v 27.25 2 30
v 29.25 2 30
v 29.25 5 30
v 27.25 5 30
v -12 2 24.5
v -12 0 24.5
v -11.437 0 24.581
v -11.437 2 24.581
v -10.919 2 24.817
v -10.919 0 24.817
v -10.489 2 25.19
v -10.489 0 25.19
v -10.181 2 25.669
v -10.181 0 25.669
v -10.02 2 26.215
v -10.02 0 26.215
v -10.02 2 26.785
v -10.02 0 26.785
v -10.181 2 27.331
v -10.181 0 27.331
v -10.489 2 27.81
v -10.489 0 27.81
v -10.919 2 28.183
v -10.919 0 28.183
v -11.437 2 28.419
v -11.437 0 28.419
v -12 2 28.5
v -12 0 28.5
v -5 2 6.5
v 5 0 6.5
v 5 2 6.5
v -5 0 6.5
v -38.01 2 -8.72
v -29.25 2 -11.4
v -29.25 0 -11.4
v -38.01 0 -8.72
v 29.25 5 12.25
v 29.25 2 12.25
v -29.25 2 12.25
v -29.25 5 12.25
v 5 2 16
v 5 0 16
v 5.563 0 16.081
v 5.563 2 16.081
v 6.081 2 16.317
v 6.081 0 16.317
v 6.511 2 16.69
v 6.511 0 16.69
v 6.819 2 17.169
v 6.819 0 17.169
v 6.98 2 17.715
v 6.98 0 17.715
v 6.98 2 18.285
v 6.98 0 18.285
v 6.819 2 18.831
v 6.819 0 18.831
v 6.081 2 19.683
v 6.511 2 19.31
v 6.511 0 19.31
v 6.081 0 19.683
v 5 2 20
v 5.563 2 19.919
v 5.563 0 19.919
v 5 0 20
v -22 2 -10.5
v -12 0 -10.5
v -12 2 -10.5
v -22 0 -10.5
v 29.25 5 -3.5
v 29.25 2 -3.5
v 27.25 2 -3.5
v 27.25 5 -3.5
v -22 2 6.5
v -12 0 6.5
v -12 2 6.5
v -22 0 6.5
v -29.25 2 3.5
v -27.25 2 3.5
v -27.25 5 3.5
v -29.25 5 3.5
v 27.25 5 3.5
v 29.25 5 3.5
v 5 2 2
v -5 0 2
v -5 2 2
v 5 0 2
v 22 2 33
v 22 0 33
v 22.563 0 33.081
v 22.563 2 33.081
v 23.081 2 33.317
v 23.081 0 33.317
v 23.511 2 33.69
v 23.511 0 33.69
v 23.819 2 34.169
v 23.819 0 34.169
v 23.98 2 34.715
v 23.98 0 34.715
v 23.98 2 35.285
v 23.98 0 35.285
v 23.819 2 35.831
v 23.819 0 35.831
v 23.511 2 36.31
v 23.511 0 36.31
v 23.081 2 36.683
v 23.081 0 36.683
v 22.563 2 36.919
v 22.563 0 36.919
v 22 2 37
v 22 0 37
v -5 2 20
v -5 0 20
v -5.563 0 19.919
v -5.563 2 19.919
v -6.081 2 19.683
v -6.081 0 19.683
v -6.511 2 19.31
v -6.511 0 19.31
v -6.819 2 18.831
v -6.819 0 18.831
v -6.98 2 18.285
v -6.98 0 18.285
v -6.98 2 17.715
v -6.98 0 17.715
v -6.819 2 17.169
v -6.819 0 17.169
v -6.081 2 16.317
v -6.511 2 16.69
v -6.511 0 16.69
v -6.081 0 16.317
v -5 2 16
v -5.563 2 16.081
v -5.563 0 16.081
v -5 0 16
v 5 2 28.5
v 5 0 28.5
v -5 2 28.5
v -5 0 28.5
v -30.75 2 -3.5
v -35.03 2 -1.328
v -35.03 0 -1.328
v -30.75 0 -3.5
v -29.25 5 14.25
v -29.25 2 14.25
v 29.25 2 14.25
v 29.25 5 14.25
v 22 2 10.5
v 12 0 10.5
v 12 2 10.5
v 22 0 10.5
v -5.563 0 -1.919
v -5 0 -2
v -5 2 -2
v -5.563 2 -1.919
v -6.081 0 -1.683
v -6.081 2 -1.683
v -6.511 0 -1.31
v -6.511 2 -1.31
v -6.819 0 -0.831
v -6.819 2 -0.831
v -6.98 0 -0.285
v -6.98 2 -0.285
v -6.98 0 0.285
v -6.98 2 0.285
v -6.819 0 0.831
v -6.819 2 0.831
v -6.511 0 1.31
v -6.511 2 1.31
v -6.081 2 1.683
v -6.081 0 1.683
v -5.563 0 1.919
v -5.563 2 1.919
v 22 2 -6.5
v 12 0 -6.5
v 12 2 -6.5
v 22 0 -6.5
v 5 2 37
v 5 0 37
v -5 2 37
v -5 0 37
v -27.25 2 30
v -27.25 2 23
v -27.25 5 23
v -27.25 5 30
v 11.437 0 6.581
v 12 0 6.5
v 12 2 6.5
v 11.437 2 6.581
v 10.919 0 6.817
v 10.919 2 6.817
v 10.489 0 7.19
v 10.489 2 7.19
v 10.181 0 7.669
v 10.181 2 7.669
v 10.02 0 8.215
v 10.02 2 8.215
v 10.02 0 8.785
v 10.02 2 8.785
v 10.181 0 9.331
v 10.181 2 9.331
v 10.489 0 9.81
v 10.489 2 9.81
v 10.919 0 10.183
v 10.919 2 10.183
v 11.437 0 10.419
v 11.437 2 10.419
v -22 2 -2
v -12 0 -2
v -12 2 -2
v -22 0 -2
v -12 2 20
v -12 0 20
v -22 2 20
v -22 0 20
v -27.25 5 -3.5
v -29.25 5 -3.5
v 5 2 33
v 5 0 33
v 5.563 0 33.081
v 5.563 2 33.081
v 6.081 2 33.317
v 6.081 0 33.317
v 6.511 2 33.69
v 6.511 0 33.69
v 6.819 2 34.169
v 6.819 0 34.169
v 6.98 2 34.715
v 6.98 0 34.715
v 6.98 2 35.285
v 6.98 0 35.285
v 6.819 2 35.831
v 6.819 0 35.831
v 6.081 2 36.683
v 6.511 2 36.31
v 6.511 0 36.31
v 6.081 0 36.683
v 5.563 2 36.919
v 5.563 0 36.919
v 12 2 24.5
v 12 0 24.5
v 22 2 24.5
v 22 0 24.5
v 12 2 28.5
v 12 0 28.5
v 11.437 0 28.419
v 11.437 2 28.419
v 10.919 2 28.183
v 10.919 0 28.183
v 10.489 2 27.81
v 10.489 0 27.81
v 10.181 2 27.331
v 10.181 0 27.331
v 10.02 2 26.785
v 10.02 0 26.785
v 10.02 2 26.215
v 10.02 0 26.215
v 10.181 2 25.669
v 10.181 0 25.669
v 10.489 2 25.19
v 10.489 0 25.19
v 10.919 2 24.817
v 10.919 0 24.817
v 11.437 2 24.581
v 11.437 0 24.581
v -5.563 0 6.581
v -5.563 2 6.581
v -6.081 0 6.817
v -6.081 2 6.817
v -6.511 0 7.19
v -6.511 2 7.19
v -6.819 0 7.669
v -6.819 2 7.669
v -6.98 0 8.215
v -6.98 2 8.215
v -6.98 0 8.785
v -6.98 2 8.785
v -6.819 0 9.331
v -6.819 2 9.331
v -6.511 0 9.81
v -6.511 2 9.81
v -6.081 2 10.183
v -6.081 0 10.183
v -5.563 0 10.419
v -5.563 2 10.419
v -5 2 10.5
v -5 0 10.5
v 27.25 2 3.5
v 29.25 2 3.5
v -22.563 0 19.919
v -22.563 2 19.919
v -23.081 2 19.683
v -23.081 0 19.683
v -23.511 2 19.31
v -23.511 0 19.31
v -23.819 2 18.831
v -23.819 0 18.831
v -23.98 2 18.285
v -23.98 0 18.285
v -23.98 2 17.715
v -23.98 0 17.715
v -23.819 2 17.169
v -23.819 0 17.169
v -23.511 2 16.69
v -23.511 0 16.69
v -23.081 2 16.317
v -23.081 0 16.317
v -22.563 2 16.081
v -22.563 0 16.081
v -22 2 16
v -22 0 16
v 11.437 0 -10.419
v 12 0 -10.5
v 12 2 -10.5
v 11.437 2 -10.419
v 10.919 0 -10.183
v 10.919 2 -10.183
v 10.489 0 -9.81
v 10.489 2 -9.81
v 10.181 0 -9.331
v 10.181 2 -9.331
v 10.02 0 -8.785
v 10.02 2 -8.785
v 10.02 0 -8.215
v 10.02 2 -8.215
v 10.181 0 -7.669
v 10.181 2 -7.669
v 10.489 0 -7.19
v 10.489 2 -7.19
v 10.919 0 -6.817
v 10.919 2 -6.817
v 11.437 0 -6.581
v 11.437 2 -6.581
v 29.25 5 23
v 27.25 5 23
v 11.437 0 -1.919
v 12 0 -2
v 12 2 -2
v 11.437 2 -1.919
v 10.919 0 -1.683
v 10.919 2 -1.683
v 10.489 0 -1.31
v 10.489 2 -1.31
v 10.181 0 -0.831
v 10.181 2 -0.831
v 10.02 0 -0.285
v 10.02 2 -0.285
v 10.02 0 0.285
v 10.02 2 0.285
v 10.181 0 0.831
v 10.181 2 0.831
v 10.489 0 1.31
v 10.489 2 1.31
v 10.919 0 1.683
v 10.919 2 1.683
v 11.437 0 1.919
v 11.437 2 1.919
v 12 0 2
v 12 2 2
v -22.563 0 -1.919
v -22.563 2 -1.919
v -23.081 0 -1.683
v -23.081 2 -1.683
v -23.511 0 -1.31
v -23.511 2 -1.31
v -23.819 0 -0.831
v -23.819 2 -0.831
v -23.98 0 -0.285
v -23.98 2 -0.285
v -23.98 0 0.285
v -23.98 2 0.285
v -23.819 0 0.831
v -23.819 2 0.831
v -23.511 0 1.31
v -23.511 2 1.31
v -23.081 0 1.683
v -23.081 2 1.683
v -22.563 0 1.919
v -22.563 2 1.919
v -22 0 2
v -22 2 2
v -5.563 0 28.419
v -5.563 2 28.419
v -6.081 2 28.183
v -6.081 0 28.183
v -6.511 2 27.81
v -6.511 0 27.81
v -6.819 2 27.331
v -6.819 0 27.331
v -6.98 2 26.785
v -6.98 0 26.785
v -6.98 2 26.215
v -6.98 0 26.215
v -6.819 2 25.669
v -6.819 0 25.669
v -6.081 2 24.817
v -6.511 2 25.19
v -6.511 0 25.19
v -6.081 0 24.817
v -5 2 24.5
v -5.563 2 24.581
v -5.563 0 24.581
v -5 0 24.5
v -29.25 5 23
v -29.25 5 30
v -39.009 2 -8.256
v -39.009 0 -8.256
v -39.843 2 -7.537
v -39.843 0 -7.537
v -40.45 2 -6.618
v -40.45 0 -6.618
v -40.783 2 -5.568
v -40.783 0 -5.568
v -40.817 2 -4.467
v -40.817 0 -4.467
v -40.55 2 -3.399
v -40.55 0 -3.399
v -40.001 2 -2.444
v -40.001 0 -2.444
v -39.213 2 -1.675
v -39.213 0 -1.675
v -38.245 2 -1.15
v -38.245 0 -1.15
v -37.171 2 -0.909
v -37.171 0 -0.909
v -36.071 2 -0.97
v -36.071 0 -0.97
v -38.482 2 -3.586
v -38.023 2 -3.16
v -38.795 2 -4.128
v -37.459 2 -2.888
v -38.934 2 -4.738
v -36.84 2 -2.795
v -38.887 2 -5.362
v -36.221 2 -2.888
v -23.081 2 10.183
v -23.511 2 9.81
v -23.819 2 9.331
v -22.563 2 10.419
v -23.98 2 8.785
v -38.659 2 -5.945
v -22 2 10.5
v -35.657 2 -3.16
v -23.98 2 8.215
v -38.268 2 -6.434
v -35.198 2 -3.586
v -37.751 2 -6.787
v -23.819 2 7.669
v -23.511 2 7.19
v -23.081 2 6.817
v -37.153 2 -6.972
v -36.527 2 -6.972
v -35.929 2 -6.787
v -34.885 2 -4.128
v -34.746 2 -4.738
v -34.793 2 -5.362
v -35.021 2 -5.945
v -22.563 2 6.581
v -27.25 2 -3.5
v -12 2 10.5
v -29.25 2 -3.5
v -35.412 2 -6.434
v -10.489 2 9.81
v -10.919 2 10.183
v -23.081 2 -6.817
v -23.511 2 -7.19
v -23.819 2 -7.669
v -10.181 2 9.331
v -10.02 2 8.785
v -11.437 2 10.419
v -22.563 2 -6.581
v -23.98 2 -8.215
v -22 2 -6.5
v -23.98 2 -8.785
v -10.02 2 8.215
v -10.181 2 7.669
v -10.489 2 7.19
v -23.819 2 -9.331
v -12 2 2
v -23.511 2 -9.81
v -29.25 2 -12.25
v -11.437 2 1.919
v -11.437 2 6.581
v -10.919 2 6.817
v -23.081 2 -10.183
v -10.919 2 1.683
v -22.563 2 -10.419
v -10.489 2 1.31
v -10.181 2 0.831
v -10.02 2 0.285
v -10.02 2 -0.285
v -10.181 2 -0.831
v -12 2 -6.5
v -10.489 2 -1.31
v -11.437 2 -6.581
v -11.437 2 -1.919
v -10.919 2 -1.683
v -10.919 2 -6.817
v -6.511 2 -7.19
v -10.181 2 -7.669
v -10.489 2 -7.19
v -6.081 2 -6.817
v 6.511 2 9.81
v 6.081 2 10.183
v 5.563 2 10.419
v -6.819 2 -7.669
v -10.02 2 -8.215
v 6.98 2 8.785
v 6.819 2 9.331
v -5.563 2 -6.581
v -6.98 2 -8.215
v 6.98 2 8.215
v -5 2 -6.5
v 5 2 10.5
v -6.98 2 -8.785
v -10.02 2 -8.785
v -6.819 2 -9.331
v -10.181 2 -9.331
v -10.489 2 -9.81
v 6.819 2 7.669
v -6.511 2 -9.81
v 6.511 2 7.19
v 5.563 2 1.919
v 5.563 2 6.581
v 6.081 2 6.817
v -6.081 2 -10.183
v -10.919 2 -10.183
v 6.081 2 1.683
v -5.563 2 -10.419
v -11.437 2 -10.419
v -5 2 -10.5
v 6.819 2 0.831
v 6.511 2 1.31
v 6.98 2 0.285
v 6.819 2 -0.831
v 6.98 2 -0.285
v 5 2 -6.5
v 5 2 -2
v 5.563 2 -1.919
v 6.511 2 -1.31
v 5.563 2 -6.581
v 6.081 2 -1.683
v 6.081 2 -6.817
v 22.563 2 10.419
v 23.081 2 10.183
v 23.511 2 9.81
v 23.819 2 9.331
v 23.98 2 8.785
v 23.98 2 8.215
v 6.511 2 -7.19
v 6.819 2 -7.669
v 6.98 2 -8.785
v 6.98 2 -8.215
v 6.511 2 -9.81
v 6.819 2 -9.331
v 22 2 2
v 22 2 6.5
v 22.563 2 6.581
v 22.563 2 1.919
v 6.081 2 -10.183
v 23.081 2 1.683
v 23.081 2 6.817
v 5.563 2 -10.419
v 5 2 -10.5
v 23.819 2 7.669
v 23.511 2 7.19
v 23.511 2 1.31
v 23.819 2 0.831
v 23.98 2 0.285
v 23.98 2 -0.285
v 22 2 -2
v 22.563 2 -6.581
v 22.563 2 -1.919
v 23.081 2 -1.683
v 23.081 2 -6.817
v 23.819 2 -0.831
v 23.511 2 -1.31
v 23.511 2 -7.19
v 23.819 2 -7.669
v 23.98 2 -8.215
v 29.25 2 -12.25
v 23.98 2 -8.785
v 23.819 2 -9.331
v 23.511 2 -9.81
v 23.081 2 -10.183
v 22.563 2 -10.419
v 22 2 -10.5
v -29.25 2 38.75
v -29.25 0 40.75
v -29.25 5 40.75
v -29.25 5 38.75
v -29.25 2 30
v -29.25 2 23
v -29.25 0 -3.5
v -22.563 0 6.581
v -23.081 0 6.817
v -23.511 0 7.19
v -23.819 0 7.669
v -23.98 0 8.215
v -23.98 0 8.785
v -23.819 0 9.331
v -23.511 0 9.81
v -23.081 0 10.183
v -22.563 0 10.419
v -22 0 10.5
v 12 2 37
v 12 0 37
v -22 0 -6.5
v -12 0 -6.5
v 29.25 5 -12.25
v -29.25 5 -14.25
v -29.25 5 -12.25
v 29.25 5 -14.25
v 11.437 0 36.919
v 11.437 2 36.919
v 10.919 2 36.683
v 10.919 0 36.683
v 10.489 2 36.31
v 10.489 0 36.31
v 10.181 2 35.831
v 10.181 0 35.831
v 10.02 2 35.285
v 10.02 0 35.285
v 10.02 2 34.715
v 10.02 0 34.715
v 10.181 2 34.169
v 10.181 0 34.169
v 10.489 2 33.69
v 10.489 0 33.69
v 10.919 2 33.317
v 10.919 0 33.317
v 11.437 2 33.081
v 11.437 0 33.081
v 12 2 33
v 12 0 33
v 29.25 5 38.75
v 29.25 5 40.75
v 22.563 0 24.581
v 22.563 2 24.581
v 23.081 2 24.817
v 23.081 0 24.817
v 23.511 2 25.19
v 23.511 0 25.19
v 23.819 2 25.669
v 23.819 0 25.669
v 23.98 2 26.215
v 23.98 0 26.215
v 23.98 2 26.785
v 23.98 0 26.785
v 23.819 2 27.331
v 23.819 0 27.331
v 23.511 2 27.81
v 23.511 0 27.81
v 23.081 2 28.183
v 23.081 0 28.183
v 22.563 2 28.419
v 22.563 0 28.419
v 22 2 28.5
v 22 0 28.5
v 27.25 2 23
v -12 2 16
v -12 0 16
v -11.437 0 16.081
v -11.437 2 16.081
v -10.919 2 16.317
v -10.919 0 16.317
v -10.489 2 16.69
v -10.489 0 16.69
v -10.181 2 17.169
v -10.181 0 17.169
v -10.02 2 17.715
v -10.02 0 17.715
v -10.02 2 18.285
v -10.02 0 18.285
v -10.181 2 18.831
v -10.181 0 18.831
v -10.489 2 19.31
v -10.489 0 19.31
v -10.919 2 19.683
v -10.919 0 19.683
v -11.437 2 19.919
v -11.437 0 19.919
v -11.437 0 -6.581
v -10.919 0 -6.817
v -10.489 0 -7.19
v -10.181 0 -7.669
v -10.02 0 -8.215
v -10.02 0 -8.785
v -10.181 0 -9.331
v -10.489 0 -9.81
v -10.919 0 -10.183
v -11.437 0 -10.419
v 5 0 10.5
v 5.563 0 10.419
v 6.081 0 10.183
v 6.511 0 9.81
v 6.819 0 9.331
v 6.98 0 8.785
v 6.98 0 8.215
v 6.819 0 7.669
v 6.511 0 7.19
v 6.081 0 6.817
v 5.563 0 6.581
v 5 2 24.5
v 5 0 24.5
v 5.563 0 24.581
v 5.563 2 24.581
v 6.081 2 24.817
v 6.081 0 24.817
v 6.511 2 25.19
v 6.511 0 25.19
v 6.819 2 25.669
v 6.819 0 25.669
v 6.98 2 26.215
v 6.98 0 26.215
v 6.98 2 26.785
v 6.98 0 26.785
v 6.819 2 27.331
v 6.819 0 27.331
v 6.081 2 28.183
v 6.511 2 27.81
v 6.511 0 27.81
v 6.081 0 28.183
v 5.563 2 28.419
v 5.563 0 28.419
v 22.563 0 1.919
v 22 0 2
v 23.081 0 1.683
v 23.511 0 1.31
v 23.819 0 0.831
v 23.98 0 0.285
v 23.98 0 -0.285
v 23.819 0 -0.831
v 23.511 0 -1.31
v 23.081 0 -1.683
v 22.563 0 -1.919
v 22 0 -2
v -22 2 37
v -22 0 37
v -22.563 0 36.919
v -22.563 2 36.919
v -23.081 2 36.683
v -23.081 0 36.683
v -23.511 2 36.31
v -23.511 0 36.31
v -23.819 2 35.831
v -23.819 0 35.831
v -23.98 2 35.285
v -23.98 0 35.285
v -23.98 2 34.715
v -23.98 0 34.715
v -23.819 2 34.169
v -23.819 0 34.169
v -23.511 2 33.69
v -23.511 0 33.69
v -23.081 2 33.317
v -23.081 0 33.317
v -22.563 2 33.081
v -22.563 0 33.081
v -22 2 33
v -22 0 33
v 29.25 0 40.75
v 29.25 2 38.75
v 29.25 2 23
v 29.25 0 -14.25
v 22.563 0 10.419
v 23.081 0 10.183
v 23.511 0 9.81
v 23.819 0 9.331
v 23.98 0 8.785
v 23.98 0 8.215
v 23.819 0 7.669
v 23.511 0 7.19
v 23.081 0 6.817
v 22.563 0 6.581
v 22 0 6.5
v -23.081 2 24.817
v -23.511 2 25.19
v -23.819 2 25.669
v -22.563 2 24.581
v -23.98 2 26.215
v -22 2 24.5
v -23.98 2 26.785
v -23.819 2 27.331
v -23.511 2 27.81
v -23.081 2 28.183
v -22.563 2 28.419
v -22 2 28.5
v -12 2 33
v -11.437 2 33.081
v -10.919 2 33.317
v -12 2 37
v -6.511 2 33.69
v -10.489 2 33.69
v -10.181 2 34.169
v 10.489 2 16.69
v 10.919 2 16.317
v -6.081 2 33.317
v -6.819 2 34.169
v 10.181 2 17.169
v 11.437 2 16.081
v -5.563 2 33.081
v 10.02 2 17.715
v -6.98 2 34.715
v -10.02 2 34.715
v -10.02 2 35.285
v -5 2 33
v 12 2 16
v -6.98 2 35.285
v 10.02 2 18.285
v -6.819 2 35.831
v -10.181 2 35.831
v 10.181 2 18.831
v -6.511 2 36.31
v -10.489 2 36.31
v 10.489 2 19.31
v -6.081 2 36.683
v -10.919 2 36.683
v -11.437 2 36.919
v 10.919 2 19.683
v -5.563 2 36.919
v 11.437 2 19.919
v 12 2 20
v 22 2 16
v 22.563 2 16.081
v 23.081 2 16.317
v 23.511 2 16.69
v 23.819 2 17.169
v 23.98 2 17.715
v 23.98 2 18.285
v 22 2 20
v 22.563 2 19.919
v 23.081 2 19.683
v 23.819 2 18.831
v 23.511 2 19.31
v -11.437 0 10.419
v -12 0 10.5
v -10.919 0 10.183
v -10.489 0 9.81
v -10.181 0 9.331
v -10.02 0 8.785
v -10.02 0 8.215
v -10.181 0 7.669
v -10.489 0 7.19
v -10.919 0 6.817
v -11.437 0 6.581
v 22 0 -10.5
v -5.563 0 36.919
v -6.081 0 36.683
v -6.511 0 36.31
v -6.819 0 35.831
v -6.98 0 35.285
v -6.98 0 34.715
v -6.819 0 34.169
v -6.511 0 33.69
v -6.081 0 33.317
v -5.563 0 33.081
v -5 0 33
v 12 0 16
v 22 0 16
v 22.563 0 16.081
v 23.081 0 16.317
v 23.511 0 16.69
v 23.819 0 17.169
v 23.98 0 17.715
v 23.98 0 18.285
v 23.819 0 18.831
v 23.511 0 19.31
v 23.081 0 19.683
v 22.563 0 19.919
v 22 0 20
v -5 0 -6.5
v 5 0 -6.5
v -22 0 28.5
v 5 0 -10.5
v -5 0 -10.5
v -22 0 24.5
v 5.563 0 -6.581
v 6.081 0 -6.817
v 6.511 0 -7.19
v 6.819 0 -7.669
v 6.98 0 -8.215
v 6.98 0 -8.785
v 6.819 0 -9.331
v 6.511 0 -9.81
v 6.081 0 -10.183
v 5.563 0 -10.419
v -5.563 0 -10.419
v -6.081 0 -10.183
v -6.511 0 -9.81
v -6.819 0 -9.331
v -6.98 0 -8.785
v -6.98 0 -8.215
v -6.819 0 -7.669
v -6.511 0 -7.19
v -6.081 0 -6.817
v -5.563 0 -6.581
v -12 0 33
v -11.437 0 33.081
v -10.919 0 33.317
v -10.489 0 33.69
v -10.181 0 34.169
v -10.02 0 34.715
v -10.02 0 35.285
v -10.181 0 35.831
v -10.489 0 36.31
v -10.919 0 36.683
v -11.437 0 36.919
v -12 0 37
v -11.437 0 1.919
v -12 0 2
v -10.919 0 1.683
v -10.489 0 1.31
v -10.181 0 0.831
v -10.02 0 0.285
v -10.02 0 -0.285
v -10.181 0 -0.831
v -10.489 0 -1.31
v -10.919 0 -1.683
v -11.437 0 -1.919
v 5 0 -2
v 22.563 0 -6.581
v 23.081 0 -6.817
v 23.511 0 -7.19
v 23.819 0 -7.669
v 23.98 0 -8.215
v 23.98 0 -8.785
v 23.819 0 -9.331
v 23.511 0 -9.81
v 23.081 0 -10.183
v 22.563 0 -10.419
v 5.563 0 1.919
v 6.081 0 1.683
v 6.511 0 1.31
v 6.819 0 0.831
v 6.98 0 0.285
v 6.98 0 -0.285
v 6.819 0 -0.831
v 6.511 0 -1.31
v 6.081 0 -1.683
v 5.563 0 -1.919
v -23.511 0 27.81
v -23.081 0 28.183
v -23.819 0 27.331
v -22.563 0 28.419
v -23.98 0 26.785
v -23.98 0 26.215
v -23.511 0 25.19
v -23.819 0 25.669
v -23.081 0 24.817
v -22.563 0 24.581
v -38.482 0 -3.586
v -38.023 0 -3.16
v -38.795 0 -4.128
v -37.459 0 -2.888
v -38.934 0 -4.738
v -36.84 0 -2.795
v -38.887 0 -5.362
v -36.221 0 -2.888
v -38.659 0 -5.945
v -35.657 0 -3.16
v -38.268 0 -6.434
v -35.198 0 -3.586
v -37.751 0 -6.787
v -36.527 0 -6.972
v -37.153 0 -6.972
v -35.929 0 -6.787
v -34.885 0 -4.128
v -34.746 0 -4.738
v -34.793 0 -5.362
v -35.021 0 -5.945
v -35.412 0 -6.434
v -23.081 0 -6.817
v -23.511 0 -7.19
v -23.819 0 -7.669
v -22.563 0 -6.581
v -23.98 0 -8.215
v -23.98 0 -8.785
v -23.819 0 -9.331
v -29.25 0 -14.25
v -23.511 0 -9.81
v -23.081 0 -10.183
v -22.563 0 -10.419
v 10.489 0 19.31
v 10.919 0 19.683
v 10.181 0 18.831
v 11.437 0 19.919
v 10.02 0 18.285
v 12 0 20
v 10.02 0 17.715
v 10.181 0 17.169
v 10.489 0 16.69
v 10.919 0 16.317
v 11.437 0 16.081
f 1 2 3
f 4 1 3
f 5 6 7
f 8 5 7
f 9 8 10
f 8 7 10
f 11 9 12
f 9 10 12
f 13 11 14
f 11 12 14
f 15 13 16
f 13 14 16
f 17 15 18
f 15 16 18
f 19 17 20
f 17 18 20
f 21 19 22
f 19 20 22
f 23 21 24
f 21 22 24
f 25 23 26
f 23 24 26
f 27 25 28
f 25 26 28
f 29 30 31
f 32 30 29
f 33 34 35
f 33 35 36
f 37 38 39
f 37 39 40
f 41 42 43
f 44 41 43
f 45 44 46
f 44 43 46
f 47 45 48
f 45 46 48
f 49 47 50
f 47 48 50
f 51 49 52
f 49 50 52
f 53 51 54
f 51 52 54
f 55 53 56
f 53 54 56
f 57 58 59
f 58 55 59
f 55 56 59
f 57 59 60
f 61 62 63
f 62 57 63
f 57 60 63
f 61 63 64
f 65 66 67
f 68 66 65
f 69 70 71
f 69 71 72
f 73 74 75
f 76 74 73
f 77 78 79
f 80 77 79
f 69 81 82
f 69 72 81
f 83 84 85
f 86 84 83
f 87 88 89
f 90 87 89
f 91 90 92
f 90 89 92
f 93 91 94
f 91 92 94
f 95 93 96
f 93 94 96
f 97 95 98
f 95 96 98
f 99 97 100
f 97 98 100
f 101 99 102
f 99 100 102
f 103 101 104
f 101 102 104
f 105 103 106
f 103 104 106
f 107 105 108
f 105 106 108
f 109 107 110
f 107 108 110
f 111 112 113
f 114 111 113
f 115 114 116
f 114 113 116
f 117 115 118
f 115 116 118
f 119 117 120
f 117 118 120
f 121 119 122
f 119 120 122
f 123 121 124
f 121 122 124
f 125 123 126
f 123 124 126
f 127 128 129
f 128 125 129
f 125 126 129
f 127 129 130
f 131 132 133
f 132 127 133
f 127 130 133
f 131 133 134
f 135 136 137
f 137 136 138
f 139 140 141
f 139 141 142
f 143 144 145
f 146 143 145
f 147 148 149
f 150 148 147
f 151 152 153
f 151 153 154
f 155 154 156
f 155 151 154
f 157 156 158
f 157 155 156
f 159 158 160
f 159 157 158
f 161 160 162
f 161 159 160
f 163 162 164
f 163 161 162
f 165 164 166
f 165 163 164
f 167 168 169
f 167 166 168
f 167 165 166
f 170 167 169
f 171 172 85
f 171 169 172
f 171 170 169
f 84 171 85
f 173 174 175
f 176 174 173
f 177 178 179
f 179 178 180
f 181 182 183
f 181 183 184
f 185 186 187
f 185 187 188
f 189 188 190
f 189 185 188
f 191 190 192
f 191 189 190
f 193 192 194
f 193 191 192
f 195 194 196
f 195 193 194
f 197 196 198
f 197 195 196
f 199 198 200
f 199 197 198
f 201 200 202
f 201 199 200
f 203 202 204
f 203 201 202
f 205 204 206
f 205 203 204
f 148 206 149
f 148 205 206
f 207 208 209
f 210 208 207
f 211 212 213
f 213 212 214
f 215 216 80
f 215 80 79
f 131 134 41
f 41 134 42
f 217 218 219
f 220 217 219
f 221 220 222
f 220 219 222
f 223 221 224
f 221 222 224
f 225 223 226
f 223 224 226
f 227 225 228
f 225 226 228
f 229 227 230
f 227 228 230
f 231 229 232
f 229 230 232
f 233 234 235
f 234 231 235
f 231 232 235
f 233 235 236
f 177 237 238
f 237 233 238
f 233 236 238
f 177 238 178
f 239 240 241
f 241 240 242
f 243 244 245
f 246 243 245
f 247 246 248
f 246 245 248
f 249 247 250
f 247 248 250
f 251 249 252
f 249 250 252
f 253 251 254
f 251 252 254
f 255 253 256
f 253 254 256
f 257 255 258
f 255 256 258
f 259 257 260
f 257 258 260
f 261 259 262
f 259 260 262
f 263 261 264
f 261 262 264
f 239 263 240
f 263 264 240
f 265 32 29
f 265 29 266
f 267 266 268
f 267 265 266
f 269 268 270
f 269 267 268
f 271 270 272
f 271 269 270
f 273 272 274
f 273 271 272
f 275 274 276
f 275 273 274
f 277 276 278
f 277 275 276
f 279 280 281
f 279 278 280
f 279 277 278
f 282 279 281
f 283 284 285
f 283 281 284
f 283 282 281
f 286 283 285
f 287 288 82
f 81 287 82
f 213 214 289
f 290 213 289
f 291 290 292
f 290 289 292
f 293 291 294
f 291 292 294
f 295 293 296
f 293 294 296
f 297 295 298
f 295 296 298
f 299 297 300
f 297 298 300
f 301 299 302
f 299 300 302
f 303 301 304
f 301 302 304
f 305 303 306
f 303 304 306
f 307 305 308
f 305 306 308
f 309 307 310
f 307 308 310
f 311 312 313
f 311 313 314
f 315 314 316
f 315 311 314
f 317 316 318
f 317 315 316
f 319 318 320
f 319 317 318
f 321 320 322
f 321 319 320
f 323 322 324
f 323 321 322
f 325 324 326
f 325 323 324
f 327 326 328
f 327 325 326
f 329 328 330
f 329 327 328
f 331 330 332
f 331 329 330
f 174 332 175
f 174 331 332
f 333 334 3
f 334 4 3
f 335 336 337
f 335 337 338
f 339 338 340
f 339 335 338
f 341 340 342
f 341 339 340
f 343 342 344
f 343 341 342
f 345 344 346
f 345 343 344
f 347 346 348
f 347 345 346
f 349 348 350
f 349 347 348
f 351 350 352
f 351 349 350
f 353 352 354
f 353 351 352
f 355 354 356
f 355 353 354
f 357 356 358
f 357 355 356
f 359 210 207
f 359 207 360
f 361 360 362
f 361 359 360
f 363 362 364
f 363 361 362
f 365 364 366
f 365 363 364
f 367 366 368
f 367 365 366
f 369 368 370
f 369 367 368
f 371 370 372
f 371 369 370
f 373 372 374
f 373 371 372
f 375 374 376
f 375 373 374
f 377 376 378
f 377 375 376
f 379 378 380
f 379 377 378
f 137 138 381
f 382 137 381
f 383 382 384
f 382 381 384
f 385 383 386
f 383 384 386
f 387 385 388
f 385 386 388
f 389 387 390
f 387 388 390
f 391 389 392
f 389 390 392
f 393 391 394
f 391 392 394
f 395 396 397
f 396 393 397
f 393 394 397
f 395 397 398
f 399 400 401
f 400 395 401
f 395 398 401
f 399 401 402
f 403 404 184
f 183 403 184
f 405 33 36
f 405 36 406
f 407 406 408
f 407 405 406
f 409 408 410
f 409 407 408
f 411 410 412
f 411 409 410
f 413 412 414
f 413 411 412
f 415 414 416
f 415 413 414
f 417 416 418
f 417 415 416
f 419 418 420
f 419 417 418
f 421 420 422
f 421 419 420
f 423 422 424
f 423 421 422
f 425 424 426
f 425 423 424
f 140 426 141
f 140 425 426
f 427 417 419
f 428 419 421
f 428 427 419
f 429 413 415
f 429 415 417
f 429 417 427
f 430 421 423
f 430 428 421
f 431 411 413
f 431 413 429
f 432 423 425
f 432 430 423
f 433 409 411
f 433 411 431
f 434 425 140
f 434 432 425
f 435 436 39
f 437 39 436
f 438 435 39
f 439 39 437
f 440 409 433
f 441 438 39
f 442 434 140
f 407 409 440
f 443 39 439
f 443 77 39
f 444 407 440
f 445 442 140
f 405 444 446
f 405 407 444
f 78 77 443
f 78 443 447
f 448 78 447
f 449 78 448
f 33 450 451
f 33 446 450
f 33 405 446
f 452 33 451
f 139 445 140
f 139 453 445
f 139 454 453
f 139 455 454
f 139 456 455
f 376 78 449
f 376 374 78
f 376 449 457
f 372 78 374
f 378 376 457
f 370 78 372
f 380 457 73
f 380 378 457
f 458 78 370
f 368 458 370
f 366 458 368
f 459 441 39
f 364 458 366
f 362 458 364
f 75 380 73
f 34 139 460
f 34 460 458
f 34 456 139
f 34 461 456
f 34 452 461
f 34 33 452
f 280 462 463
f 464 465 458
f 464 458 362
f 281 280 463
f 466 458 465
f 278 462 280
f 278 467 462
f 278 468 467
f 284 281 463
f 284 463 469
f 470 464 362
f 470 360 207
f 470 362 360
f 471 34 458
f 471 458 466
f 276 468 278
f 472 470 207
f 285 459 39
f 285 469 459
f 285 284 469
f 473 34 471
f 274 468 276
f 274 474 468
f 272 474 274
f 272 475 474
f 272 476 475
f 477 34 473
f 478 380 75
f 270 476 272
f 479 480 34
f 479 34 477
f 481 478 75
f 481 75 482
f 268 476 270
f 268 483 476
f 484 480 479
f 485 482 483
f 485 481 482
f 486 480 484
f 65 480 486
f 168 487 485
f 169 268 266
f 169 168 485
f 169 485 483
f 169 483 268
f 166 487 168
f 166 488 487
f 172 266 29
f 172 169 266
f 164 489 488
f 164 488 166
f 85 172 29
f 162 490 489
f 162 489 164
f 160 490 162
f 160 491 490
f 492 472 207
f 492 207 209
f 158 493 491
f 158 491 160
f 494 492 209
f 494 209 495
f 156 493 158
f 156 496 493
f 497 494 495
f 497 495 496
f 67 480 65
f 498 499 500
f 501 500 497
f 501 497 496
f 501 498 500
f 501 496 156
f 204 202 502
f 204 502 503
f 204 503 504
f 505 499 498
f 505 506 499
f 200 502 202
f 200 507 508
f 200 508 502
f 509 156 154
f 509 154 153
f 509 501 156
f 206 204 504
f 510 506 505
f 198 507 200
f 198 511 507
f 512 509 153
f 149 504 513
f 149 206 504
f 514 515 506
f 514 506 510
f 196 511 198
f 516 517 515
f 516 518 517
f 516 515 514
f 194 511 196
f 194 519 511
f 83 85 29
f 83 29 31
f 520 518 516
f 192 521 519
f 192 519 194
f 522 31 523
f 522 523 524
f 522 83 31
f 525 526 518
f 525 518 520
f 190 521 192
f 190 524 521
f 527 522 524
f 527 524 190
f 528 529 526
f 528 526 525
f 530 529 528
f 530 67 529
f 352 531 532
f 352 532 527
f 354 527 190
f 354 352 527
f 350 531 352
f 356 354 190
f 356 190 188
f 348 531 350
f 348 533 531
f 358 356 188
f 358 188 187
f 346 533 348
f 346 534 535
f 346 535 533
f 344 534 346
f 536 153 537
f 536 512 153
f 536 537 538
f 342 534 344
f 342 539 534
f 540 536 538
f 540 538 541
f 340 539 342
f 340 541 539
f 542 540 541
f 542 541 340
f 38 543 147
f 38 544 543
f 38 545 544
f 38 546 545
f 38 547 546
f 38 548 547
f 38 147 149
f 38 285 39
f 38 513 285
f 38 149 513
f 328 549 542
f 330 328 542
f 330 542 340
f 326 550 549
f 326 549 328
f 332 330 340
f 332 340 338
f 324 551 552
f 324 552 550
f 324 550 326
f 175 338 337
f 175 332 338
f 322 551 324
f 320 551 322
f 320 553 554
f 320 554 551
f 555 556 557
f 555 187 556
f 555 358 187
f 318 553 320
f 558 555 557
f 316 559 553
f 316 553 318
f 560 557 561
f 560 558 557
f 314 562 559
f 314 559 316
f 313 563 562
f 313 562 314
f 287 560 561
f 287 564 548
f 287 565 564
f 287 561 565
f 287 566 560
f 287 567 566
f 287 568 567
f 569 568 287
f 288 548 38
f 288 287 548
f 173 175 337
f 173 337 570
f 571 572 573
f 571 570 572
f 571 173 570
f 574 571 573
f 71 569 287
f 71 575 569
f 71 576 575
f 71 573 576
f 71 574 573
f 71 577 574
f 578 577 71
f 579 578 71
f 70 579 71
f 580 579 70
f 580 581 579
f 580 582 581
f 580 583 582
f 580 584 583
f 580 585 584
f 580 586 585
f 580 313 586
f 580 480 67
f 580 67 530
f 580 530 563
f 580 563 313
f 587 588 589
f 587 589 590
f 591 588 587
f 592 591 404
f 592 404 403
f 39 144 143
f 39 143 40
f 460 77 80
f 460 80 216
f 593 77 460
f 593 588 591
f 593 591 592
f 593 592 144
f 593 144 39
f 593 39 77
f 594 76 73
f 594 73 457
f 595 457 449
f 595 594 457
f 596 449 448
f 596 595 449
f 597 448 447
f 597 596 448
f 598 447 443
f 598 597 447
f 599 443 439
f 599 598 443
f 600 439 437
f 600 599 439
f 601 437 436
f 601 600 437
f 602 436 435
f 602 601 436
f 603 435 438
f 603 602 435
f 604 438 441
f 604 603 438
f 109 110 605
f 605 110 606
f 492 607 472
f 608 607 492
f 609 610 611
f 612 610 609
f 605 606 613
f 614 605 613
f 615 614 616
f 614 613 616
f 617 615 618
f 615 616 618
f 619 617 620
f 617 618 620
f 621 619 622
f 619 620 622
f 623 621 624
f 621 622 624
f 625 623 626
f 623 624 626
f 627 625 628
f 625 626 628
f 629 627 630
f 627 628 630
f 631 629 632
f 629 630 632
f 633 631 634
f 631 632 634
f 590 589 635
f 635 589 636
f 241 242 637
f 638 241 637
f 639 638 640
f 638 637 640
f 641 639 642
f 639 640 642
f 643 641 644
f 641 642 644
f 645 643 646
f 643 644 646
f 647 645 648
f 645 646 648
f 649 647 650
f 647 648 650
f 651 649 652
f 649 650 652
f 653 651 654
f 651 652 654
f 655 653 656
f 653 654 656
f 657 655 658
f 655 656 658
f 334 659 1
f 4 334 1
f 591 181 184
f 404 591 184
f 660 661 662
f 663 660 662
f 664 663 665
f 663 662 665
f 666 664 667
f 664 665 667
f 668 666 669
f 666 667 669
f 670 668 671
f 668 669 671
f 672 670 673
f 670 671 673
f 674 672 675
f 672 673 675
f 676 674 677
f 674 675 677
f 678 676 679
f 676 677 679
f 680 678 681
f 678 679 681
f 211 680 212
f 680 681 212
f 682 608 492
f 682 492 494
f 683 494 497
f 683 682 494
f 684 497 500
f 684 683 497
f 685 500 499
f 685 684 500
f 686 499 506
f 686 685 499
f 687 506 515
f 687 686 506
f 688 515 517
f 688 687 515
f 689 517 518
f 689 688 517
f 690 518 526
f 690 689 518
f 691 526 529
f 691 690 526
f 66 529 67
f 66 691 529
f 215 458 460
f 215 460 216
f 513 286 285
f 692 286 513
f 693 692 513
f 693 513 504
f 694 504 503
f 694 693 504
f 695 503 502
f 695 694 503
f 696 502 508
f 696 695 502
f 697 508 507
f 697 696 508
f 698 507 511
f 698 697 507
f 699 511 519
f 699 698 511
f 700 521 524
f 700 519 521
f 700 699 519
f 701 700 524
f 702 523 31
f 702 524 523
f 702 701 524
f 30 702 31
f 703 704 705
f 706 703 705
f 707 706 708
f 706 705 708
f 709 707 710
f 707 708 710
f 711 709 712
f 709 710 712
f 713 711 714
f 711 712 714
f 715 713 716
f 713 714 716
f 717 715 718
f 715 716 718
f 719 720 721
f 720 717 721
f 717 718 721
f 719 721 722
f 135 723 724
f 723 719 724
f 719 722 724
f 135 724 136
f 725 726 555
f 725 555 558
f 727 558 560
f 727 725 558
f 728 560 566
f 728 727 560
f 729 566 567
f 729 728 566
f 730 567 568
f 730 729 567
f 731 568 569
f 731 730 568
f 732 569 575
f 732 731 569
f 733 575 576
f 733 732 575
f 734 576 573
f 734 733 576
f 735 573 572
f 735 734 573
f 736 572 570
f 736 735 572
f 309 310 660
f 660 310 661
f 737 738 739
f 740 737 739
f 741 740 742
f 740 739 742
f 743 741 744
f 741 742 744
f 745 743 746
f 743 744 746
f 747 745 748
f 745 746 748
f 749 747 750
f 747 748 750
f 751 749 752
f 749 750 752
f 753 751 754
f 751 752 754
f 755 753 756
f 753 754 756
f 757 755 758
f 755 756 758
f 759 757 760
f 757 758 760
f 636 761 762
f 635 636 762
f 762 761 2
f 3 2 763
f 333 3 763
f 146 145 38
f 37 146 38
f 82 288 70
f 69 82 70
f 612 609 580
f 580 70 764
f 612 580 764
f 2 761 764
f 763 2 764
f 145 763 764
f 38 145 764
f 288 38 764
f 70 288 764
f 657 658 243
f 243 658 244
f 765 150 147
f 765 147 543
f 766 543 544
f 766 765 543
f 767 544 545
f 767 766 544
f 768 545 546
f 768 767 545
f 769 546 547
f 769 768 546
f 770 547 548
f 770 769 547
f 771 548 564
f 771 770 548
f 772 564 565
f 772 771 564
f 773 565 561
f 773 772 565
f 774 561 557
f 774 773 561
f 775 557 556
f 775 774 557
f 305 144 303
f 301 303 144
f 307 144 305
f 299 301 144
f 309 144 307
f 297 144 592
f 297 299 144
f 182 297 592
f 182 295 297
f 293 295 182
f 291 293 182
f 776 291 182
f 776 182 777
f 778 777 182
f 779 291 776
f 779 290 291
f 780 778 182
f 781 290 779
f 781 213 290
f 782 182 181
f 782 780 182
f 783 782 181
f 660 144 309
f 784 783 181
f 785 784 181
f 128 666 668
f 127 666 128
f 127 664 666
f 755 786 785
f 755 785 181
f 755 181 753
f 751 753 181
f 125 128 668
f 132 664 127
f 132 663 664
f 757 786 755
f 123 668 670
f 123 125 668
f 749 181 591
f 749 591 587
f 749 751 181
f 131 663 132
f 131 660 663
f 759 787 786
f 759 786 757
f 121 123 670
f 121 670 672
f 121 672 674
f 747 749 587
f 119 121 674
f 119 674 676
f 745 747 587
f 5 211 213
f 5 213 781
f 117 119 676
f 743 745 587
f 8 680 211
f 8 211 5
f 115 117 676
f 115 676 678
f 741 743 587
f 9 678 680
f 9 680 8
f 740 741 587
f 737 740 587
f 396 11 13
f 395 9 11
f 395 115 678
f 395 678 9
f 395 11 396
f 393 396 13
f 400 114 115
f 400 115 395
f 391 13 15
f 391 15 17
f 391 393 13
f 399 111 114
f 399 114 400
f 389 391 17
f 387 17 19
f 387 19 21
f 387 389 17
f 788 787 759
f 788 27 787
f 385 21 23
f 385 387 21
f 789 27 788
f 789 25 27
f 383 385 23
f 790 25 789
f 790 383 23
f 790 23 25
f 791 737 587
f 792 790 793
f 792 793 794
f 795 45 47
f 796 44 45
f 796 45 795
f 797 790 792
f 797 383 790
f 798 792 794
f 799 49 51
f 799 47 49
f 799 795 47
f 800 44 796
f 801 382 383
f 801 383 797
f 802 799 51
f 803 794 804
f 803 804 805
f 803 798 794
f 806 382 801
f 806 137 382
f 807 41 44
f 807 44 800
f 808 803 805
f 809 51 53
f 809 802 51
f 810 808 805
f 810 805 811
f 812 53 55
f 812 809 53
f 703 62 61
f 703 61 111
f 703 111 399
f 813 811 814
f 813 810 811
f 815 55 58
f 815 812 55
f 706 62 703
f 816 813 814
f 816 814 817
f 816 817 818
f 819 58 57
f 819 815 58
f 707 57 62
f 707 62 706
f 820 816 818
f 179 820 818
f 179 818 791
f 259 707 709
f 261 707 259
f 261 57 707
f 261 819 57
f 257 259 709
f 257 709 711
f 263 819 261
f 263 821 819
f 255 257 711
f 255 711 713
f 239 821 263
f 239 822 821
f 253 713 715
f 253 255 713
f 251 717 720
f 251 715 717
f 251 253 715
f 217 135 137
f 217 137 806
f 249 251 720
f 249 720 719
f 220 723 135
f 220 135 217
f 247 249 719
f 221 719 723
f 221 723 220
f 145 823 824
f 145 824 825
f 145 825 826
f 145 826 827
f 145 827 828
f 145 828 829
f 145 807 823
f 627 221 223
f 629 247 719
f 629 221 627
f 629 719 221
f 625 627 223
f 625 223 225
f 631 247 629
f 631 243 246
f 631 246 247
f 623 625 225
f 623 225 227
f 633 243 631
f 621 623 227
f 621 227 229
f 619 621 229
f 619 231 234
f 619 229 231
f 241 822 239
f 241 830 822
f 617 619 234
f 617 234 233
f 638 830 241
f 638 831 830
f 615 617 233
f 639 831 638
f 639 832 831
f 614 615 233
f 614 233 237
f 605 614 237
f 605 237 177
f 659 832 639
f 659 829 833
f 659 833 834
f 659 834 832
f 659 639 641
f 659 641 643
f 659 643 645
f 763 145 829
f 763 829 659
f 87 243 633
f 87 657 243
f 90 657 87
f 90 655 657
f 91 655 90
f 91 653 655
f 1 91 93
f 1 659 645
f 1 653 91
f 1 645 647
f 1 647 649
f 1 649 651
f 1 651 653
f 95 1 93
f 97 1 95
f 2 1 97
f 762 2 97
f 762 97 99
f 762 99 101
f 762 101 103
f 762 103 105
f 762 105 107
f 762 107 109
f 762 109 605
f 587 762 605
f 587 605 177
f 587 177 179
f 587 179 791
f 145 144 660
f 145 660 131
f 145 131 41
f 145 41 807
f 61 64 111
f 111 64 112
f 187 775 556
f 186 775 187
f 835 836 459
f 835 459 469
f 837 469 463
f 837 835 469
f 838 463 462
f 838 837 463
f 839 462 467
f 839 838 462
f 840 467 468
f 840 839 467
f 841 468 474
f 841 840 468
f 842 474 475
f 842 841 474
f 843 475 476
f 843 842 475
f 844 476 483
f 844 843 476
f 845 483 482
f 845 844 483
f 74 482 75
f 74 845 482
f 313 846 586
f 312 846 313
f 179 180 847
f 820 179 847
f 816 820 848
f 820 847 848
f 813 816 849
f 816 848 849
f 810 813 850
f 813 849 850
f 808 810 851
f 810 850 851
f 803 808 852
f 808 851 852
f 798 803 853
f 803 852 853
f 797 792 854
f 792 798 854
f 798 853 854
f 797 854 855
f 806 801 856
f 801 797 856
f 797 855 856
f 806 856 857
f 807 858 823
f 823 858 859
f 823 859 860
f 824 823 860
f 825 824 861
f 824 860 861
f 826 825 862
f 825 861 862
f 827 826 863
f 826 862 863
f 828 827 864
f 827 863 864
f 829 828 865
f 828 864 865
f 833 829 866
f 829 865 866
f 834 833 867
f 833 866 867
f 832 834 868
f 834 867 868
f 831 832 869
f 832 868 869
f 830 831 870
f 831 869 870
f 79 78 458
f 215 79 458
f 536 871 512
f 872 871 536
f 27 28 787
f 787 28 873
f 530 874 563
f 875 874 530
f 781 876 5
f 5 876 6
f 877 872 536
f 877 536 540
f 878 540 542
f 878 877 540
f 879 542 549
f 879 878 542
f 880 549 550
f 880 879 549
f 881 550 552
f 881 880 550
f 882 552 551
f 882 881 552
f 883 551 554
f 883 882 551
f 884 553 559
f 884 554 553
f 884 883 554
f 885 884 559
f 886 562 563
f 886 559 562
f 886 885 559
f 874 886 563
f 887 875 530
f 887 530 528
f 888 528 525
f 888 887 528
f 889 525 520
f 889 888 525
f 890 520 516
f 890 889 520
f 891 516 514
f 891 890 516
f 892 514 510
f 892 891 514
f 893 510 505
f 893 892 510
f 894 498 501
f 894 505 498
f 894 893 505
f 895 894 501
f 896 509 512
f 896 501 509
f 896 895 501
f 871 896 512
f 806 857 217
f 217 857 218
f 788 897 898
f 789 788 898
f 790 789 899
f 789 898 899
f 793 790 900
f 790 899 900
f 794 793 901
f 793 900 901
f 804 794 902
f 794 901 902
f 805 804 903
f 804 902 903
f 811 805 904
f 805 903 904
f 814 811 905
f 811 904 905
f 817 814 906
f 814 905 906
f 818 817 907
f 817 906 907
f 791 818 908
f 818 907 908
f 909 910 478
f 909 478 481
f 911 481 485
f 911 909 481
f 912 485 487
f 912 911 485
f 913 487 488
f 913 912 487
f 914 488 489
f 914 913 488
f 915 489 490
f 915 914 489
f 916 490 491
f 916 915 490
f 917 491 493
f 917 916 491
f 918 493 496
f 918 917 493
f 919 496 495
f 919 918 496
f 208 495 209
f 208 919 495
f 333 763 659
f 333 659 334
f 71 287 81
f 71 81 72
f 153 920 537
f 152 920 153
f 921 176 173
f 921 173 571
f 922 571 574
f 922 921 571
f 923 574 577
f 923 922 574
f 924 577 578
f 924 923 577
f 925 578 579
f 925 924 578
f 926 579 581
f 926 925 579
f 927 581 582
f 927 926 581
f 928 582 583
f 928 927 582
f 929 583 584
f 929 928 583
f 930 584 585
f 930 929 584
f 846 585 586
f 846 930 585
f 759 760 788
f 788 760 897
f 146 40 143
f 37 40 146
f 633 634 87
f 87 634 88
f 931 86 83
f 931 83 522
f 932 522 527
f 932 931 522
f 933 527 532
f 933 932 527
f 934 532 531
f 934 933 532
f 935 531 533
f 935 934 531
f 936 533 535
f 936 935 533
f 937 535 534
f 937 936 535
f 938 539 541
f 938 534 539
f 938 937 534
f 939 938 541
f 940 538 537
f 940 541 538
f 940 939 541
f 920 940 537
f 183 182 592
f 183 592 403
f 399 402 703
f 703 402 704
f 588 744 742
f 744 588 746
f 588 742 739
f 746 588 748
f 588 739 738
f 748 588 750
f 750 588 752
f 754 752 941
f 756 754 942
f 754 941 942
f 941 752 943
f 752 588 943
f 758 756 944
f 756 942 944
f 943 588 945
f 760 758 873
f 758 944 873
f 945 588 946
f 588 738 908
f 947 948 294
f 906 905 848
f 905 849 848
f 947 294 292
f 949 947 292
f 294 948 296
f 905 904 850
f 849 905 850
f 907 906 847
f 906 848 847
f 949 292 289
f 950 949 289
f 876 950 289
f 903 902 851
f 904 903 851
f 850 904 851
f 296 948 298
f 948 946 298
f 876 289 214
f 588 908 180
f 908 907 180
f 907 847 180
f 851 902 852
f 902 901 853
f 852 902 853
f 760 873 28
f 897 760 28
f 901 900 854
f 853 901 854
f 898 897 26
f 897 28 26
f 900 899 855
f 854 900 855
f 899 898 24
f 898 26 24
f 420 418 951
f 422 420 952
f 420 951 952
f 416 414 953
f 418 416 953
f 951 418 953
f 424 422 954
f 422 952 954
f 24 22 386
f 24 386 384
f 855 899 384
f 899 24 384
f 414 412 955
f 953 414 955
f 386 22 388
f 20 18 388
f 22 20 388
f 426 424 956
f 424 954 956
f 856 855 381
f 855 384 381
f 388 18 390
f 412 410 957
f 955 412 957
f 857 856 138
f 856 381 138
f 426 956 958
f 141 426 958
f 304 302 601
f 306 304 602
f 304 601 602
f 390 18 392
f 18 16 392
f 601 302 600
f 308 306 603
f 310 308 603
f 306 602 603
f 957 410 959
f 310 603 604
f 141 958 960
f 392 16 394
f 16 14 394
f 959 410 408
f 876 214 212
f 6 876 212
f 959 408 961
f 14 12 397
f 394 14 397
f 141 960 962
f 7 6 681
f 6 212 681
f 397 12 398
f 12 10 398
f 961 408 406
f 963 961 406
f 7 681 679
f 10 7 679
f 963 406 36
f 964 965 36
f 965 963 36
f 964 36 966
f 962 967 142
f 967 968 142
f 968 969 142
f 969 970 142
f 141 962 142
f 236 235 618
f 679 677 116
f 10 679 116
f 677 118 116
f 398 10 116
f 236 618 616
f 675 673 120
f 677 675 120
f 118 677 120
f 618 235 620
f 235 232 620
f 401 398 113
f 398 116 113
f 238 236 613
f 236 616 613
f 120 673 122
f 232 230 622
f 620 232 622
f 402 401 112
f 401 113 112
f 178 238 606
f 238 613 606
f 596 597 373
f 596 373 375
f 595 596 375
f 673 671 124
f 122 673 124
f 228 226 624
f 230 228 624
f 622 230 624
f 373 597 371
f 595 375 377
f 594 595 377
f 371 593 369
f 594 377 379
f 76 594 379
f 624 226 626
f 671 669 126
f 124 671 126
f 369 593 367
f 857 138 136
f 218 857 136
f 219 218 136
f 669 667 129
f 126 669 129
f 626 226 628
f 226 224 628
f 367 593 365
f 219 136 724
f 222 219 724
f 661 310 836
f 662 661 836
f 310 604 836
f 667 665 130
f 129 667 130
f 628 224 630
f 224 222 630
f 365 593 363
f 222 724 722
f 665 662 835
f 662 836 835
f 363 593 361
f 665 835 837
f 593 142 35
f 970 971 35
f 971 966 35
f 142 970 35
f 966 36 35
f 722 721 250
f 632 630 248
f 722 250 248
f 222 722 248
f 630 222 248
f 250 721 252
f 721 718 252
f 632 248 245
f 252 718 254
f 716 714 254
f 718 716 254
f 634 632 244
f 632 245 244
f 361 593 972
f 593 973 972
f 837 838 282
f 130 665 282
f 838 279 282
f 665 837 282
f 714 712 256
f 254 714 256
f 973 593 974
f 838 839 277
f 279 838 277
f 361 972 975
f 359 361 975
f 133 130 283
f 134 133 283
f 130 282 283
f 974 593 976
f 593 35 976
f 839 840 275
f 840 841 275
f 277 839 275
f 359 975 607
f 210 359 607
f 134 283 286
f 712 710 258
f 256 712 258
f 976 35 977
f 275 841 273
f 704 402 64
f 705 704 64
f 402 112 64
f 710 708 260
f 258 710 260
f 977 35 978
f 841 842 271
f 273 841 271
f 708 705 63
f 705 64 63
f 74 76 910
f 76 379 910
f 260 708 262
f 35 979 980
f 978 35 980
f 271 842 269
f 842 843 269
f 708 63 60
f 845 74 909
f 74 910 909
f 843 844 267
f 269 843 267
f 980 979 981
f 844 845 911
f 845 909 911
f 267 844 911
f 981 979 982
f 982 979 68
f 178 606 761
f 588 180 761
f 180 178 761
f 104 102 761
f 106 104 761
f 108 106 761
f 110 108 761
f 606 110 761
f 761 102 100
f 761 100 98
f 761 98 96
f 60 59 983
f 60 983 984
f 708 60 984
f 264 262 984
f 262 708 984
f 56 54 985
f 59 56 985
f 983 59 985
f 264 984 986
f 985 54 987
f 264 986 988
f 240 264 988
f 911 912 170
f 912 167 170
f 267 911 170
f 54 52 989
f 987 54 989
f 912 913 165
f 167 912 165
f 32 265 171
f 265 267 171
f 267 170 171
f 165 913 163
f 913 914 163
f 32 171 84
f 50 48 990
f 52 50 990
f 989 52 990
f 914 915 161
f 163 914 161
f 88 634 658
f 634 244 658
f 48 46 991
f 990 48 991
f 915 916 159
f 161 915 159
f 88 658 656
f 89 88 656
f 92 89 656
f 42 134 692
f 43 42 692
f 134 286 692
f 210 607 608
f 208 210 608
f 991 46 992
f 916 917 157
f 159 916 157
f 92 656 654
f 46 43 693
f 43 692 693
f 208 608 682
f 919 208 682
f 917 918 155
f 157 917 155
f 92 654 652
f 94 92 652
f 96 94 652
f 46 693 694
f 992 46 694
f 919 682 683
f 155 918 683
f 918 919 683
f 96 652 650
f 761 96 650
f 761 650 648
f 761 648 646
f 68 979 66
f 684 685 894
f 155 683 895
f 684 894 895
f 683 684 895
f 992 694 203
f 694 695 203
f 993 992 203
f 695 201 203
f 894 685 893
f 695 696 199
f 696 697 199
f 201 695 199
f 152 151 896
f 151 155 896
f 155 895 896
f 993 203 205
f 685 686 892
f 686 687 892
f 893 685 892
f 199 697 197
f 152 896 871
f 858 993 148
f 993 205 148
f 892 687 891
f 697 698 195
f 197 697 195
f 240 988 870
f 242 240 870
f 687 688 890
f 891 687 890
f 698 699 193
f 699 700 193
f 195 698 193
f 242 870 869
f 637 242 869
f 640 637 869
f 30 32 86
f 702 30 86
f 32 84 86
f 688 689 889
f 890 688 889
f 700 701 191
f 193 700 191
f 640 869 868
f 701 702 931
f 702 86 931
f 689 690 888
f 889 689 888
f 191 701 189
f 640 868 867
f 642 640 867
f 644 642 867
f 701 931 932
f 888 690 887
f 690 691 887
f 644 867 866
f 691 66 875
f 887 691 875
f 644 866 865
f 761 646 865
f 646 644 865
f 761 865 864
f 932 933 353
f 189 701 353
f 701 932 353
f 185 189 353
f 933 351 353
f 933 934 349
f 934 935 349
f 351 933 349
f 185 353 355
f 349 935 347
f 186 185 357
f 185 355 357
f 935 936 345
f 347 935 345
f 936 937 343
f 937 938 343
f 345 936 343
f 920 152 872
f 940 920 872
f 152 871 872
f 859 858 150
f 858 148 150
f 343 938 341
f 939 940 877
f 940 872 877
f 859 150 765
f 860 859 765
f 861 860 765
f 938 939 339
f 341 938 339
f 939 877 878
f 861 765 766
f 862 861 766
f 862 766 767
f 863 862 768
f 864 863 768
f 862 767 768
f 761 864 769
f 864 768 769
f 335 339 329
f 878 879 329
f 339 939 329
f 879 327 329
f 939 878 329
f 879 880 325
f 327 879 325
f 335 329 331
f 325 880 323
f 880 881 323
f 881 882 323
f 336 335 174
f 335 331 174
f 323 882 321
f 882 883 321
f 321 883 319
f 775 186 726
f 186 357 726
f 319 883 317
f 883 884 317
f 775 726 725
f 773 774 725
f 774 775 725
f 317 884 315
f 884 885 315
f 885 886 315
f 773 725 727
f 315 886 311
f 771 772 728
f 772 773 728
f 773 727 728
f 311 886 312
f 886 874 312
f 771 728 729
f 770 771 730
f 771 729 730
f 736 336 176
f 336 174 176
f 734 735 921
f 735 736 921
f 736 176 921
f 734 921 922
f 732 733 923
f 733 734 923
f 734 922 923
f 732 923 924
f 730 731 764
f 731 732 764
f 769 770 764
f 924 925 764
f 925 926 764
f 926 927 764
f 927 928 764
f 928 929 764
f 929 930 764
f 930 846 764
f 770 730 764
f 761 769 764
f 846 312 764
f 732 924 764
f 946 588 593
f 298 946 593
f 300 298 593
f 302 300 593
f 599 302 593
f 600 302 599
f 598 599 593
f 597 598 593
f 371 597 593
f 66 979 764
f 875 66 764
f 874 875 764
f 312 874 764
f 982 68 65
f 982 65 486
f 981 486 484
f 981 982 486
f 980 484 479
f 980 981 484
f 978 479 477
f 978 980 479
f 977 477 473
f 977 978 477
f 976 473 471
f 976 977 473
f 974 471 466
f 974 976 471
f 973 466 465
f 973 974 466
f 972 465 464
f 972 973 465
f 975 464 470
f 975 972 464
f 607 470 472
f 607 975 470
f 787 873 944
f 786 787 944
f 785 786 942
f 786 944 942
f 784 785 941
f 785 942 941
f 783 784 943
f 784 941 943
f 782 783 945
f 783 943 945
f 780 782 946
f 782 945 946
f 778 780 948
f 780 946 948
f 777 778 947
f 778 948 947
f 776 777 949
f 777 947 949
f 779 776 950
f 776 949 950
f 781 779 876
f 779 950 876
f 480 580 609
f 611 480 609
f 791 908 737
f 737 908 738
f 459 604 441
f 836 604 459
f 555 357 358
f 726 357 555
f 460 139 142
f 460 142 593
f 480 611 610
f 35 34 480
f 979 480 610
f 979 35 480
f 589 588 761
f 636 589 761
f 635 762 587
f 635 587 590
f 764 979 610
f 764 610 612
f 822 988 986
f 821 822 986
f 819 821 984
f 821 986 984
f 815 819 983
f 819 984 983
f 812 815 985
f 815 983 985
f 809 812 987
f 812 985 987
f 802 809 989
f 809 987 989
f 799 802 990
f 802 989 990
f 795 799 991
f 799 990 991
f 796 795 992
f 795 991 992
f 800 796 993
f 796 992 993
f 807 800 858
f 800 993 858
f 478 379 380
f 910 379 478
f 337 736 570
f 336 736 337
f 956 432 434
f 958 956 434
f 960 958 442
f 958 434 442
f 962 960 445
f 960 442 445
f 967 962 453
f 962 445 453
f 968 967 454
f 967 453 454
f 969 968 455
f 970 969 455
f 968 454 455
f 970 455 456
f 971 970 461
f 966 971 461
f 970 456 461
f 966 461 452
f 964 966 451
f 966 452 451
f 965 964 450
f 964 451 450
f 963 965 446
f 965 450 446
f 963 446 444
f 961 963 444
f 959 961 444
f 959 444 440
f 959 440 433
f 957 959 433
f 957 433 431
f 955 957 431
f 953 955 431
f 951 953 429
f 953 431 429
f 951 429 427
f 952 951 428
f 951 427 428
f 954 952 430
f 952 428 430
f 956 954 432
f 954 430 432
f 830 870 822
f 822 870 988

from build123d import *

# Parameters (mm, degrees)
SKETCH1_W           = 54.5
SKETCH1_H           = 24.5
BOSS_EXTRUDE1_DEPTH = 2
BOSS_EXTRUDE2_START = -2
SKETCH2_W           = 58.5
SKETCH2_H           = 28.5
SKETCH2_W_2         = 54.5
SKETCH2_H_2         = 24.5
BOSS_EXTRUDE2_DEPTH = 5
CUT_EXTRUDE1_DEPTH  = 33.918459867
FILL_PATTERN1_DEPTH = 2
LPATTERN1_COUNT     = 2
LPATTERN1_PITCH     = 8.5
LPATTERN1_COL_COUNT = 2
LPATTERN1_COL_PITCH = 8.5
SKETCH13_W          = 8.75
SKETCH13_H          = 3
CUT_EXTRUDE2_DEPTH  = 61.417816081
SKETCH34_R          = 2.1
BOSS_EXTRUDE4_DEPTH = 2


# Read off the part's stored shape, not the designer's step: Fill Pattern1
with BuildPart() as part:
    # Sketch1 → Boss-Extrude1 (new body)
    with BuildSketch(Plane(origin=(0, 0, 0), x_dir=(1, 0, 0), z_dir=(0, 1, 0))):
        Rectangle(SKETCH1_W, SKETCH1_H)
    extrude(amount=BOSS_EXTRUDE1_DEPTH)

    # Sketch2 → Boss-Extrude2 (add)
    with BuildSketch(Plane(origin=(0, 2, 0), x_dir=(1, 0, 0), z_dir=(0, 1, 0)).offset(BOSS_EXTRUDE2_START)):
        Rectangle(SKETCH2_W, SKETCH2_H)
        Rectangle(SKETCH2_W_2, SKETCH2_H_2, mode=Mode.SUBTRACT)
    extrude(amount=BOSS_EXTRUDE2_DEPTH)

    # Sketch5 → Cut-Extrude1 (cut, through all)
    with BuildSketch(Plane.XZ):
        with BuildLine():
            Line((-5, 2), (5, 2))
            ThreePointArc((5, 2), (7, 0), (5, -2))
            Line((5, -2), (-5, -2))
            ThreePointArc((-5, -2), (-7, 0), (-5, 2))
        make_face()
    cut_extrude1 = extrude(amount=-CUT_EXTRUDE1_DEPTH, mode=Mode.SUBTRACT)

    # Fill Pattern1 outline → Fill Pattern1 (cut)
    with BuildSketch(Plane(origin=(0, 0, 0), x_dir=(1, 0, 0), z_dir=(0, 1, 0))):
        with BuildLine():
            ThreePointArc((-22, 2), (-24, 0), (-22, -2))
            Line((-22, -2), (-12, -2))
            ThreePointArc((-12, -2), (-10, 0), (-12, 2))
            Line((-12, 2), (-22, 2))
        make_face()
        with BuildLine():
            ThreePointArc((12, 2), (10, 0), (12, -2))
            Line((12, -2), (22, -2))
            ThreePointArc((22, -2), (24, 0), (22, 2))
            Line((22, 2), (12, 2))
        make_face()
        with BuildLine():
            ThreePointArc((-22, 10.5), (-24, 8.5), (-22, 6.5))
            Line((-22, 6.5), (-12, 6.5))
            ThreePointArc((-12, 6.5), (-10, 8.5), (-12, 10.5))
            Line((-12, 10.5), (-22, 10.5))
        make_face()
        with BuildLine():
            ThreePointArc((12, 10.5), (10, 8.5), (12, 6.5))
            Line((12, 6.5), (22, 6.5))
            ThreePointArc((22, 6.5), (24, 8.5), (22, 10.5))
            Line((22, 10.5), (12, 10.5))
        make_face()
        with BuildLine():
            ThreePointArc((-22, -6.5), (-24, -8.5), (-22, -10.5))
            Line((-22, -10.5), (-12, -10.5))
            ThreePointArc((-12, -10.5), (-10, -8.5), (-12, -6.5))
            Line((-12, -6.5), (-22, -6.5))
        make_face()
        with BuildLine():
            ThreePointArc((12, -6.5), (10, -8.5), (12, -10.5))
            Line((12, -10.5), (22, -10.5))
            ThreePointArc((22, -10.5), (24, -8.5), (22, -6.5))
            Line((22, -6.5), (12, -6.5))
        make_face()
    extrude(amount=FILL_PATTERN1_DEPTH, mode=Mode.SUBTRACT)

    # LPattern1: Cut-Extrude1 ×2
    with Locations(*[(0, 0, i * LPATTERN1_PITCH) for i in range(1, LPATTERN1_COUNT)]):
        add(cut_extrude1, mode=Mode.SUBTRACT)

    # LPattern1 col: Cut-Extrude1 ×2
    with Locations(*[(0, 0, -i * LPATTERN1_COL_PITCH) for i in range(1, LPATTERN1_COL_COUNT)]):
        add(cut_extrude1, mode=Mode.SUBTRACT)

    # Sketch13 → Cut-Extrude2 (cut, through all)
    with BuildSketch(Plane(origin=(29.25, 0, 0), x_dir=(0, 0, -1), z_dir=(1, 0, 0))):
        with Locations((-7.875, 3.5)):
            Rectangle(SKETCH13_W, SKETCH13_H)
        with Locations((7.875, 3.5)):
            Rectangle(SKETCH13_W, SKETCH13_H)
    extrude(amount=-CUT_EXTRUDE2_DEPTH, mode=Mode.SUBTRACT)

    # Mirror1: part across plane


with BuildPart() as part_1:
    add(part.part)
    add(part.part.mirror(Plane.XY.offset(13.25)))

    # Sketch34 → Boss-Extrude4 (add)
    with BuildSketch(Plane(origin=(0, 2, 0), x_dir=(1, 0, 0), z_dir=(0, 1, 0))):
        with BuildLine():
            Line((-29.25, 11.400334068), (-38.010329233, 8.719922842))
            ThreePointArc((-38.010329233, 8.719922842), (-40.54977577, 3.399112638), (-35.029778513, 1.328016256))
            Line((-35.029778513, 1.328016256), (-30.75, 3.5))
            Line((-30.75, 3.5), (-29.25, 3.5))
            Line((-29.25, 3.5), (-29.25, 11.400334068))
        make_face()
        with Locations(Location((-36.84, 4.894961472, 0), (0, 0, 270))):
            Circle(SKETCH34_R, mode=Mode.SUBTRACT)
    extrude(amount=-BOSS_EXTRUDE4_DEPTH)


solid = part_1.part
